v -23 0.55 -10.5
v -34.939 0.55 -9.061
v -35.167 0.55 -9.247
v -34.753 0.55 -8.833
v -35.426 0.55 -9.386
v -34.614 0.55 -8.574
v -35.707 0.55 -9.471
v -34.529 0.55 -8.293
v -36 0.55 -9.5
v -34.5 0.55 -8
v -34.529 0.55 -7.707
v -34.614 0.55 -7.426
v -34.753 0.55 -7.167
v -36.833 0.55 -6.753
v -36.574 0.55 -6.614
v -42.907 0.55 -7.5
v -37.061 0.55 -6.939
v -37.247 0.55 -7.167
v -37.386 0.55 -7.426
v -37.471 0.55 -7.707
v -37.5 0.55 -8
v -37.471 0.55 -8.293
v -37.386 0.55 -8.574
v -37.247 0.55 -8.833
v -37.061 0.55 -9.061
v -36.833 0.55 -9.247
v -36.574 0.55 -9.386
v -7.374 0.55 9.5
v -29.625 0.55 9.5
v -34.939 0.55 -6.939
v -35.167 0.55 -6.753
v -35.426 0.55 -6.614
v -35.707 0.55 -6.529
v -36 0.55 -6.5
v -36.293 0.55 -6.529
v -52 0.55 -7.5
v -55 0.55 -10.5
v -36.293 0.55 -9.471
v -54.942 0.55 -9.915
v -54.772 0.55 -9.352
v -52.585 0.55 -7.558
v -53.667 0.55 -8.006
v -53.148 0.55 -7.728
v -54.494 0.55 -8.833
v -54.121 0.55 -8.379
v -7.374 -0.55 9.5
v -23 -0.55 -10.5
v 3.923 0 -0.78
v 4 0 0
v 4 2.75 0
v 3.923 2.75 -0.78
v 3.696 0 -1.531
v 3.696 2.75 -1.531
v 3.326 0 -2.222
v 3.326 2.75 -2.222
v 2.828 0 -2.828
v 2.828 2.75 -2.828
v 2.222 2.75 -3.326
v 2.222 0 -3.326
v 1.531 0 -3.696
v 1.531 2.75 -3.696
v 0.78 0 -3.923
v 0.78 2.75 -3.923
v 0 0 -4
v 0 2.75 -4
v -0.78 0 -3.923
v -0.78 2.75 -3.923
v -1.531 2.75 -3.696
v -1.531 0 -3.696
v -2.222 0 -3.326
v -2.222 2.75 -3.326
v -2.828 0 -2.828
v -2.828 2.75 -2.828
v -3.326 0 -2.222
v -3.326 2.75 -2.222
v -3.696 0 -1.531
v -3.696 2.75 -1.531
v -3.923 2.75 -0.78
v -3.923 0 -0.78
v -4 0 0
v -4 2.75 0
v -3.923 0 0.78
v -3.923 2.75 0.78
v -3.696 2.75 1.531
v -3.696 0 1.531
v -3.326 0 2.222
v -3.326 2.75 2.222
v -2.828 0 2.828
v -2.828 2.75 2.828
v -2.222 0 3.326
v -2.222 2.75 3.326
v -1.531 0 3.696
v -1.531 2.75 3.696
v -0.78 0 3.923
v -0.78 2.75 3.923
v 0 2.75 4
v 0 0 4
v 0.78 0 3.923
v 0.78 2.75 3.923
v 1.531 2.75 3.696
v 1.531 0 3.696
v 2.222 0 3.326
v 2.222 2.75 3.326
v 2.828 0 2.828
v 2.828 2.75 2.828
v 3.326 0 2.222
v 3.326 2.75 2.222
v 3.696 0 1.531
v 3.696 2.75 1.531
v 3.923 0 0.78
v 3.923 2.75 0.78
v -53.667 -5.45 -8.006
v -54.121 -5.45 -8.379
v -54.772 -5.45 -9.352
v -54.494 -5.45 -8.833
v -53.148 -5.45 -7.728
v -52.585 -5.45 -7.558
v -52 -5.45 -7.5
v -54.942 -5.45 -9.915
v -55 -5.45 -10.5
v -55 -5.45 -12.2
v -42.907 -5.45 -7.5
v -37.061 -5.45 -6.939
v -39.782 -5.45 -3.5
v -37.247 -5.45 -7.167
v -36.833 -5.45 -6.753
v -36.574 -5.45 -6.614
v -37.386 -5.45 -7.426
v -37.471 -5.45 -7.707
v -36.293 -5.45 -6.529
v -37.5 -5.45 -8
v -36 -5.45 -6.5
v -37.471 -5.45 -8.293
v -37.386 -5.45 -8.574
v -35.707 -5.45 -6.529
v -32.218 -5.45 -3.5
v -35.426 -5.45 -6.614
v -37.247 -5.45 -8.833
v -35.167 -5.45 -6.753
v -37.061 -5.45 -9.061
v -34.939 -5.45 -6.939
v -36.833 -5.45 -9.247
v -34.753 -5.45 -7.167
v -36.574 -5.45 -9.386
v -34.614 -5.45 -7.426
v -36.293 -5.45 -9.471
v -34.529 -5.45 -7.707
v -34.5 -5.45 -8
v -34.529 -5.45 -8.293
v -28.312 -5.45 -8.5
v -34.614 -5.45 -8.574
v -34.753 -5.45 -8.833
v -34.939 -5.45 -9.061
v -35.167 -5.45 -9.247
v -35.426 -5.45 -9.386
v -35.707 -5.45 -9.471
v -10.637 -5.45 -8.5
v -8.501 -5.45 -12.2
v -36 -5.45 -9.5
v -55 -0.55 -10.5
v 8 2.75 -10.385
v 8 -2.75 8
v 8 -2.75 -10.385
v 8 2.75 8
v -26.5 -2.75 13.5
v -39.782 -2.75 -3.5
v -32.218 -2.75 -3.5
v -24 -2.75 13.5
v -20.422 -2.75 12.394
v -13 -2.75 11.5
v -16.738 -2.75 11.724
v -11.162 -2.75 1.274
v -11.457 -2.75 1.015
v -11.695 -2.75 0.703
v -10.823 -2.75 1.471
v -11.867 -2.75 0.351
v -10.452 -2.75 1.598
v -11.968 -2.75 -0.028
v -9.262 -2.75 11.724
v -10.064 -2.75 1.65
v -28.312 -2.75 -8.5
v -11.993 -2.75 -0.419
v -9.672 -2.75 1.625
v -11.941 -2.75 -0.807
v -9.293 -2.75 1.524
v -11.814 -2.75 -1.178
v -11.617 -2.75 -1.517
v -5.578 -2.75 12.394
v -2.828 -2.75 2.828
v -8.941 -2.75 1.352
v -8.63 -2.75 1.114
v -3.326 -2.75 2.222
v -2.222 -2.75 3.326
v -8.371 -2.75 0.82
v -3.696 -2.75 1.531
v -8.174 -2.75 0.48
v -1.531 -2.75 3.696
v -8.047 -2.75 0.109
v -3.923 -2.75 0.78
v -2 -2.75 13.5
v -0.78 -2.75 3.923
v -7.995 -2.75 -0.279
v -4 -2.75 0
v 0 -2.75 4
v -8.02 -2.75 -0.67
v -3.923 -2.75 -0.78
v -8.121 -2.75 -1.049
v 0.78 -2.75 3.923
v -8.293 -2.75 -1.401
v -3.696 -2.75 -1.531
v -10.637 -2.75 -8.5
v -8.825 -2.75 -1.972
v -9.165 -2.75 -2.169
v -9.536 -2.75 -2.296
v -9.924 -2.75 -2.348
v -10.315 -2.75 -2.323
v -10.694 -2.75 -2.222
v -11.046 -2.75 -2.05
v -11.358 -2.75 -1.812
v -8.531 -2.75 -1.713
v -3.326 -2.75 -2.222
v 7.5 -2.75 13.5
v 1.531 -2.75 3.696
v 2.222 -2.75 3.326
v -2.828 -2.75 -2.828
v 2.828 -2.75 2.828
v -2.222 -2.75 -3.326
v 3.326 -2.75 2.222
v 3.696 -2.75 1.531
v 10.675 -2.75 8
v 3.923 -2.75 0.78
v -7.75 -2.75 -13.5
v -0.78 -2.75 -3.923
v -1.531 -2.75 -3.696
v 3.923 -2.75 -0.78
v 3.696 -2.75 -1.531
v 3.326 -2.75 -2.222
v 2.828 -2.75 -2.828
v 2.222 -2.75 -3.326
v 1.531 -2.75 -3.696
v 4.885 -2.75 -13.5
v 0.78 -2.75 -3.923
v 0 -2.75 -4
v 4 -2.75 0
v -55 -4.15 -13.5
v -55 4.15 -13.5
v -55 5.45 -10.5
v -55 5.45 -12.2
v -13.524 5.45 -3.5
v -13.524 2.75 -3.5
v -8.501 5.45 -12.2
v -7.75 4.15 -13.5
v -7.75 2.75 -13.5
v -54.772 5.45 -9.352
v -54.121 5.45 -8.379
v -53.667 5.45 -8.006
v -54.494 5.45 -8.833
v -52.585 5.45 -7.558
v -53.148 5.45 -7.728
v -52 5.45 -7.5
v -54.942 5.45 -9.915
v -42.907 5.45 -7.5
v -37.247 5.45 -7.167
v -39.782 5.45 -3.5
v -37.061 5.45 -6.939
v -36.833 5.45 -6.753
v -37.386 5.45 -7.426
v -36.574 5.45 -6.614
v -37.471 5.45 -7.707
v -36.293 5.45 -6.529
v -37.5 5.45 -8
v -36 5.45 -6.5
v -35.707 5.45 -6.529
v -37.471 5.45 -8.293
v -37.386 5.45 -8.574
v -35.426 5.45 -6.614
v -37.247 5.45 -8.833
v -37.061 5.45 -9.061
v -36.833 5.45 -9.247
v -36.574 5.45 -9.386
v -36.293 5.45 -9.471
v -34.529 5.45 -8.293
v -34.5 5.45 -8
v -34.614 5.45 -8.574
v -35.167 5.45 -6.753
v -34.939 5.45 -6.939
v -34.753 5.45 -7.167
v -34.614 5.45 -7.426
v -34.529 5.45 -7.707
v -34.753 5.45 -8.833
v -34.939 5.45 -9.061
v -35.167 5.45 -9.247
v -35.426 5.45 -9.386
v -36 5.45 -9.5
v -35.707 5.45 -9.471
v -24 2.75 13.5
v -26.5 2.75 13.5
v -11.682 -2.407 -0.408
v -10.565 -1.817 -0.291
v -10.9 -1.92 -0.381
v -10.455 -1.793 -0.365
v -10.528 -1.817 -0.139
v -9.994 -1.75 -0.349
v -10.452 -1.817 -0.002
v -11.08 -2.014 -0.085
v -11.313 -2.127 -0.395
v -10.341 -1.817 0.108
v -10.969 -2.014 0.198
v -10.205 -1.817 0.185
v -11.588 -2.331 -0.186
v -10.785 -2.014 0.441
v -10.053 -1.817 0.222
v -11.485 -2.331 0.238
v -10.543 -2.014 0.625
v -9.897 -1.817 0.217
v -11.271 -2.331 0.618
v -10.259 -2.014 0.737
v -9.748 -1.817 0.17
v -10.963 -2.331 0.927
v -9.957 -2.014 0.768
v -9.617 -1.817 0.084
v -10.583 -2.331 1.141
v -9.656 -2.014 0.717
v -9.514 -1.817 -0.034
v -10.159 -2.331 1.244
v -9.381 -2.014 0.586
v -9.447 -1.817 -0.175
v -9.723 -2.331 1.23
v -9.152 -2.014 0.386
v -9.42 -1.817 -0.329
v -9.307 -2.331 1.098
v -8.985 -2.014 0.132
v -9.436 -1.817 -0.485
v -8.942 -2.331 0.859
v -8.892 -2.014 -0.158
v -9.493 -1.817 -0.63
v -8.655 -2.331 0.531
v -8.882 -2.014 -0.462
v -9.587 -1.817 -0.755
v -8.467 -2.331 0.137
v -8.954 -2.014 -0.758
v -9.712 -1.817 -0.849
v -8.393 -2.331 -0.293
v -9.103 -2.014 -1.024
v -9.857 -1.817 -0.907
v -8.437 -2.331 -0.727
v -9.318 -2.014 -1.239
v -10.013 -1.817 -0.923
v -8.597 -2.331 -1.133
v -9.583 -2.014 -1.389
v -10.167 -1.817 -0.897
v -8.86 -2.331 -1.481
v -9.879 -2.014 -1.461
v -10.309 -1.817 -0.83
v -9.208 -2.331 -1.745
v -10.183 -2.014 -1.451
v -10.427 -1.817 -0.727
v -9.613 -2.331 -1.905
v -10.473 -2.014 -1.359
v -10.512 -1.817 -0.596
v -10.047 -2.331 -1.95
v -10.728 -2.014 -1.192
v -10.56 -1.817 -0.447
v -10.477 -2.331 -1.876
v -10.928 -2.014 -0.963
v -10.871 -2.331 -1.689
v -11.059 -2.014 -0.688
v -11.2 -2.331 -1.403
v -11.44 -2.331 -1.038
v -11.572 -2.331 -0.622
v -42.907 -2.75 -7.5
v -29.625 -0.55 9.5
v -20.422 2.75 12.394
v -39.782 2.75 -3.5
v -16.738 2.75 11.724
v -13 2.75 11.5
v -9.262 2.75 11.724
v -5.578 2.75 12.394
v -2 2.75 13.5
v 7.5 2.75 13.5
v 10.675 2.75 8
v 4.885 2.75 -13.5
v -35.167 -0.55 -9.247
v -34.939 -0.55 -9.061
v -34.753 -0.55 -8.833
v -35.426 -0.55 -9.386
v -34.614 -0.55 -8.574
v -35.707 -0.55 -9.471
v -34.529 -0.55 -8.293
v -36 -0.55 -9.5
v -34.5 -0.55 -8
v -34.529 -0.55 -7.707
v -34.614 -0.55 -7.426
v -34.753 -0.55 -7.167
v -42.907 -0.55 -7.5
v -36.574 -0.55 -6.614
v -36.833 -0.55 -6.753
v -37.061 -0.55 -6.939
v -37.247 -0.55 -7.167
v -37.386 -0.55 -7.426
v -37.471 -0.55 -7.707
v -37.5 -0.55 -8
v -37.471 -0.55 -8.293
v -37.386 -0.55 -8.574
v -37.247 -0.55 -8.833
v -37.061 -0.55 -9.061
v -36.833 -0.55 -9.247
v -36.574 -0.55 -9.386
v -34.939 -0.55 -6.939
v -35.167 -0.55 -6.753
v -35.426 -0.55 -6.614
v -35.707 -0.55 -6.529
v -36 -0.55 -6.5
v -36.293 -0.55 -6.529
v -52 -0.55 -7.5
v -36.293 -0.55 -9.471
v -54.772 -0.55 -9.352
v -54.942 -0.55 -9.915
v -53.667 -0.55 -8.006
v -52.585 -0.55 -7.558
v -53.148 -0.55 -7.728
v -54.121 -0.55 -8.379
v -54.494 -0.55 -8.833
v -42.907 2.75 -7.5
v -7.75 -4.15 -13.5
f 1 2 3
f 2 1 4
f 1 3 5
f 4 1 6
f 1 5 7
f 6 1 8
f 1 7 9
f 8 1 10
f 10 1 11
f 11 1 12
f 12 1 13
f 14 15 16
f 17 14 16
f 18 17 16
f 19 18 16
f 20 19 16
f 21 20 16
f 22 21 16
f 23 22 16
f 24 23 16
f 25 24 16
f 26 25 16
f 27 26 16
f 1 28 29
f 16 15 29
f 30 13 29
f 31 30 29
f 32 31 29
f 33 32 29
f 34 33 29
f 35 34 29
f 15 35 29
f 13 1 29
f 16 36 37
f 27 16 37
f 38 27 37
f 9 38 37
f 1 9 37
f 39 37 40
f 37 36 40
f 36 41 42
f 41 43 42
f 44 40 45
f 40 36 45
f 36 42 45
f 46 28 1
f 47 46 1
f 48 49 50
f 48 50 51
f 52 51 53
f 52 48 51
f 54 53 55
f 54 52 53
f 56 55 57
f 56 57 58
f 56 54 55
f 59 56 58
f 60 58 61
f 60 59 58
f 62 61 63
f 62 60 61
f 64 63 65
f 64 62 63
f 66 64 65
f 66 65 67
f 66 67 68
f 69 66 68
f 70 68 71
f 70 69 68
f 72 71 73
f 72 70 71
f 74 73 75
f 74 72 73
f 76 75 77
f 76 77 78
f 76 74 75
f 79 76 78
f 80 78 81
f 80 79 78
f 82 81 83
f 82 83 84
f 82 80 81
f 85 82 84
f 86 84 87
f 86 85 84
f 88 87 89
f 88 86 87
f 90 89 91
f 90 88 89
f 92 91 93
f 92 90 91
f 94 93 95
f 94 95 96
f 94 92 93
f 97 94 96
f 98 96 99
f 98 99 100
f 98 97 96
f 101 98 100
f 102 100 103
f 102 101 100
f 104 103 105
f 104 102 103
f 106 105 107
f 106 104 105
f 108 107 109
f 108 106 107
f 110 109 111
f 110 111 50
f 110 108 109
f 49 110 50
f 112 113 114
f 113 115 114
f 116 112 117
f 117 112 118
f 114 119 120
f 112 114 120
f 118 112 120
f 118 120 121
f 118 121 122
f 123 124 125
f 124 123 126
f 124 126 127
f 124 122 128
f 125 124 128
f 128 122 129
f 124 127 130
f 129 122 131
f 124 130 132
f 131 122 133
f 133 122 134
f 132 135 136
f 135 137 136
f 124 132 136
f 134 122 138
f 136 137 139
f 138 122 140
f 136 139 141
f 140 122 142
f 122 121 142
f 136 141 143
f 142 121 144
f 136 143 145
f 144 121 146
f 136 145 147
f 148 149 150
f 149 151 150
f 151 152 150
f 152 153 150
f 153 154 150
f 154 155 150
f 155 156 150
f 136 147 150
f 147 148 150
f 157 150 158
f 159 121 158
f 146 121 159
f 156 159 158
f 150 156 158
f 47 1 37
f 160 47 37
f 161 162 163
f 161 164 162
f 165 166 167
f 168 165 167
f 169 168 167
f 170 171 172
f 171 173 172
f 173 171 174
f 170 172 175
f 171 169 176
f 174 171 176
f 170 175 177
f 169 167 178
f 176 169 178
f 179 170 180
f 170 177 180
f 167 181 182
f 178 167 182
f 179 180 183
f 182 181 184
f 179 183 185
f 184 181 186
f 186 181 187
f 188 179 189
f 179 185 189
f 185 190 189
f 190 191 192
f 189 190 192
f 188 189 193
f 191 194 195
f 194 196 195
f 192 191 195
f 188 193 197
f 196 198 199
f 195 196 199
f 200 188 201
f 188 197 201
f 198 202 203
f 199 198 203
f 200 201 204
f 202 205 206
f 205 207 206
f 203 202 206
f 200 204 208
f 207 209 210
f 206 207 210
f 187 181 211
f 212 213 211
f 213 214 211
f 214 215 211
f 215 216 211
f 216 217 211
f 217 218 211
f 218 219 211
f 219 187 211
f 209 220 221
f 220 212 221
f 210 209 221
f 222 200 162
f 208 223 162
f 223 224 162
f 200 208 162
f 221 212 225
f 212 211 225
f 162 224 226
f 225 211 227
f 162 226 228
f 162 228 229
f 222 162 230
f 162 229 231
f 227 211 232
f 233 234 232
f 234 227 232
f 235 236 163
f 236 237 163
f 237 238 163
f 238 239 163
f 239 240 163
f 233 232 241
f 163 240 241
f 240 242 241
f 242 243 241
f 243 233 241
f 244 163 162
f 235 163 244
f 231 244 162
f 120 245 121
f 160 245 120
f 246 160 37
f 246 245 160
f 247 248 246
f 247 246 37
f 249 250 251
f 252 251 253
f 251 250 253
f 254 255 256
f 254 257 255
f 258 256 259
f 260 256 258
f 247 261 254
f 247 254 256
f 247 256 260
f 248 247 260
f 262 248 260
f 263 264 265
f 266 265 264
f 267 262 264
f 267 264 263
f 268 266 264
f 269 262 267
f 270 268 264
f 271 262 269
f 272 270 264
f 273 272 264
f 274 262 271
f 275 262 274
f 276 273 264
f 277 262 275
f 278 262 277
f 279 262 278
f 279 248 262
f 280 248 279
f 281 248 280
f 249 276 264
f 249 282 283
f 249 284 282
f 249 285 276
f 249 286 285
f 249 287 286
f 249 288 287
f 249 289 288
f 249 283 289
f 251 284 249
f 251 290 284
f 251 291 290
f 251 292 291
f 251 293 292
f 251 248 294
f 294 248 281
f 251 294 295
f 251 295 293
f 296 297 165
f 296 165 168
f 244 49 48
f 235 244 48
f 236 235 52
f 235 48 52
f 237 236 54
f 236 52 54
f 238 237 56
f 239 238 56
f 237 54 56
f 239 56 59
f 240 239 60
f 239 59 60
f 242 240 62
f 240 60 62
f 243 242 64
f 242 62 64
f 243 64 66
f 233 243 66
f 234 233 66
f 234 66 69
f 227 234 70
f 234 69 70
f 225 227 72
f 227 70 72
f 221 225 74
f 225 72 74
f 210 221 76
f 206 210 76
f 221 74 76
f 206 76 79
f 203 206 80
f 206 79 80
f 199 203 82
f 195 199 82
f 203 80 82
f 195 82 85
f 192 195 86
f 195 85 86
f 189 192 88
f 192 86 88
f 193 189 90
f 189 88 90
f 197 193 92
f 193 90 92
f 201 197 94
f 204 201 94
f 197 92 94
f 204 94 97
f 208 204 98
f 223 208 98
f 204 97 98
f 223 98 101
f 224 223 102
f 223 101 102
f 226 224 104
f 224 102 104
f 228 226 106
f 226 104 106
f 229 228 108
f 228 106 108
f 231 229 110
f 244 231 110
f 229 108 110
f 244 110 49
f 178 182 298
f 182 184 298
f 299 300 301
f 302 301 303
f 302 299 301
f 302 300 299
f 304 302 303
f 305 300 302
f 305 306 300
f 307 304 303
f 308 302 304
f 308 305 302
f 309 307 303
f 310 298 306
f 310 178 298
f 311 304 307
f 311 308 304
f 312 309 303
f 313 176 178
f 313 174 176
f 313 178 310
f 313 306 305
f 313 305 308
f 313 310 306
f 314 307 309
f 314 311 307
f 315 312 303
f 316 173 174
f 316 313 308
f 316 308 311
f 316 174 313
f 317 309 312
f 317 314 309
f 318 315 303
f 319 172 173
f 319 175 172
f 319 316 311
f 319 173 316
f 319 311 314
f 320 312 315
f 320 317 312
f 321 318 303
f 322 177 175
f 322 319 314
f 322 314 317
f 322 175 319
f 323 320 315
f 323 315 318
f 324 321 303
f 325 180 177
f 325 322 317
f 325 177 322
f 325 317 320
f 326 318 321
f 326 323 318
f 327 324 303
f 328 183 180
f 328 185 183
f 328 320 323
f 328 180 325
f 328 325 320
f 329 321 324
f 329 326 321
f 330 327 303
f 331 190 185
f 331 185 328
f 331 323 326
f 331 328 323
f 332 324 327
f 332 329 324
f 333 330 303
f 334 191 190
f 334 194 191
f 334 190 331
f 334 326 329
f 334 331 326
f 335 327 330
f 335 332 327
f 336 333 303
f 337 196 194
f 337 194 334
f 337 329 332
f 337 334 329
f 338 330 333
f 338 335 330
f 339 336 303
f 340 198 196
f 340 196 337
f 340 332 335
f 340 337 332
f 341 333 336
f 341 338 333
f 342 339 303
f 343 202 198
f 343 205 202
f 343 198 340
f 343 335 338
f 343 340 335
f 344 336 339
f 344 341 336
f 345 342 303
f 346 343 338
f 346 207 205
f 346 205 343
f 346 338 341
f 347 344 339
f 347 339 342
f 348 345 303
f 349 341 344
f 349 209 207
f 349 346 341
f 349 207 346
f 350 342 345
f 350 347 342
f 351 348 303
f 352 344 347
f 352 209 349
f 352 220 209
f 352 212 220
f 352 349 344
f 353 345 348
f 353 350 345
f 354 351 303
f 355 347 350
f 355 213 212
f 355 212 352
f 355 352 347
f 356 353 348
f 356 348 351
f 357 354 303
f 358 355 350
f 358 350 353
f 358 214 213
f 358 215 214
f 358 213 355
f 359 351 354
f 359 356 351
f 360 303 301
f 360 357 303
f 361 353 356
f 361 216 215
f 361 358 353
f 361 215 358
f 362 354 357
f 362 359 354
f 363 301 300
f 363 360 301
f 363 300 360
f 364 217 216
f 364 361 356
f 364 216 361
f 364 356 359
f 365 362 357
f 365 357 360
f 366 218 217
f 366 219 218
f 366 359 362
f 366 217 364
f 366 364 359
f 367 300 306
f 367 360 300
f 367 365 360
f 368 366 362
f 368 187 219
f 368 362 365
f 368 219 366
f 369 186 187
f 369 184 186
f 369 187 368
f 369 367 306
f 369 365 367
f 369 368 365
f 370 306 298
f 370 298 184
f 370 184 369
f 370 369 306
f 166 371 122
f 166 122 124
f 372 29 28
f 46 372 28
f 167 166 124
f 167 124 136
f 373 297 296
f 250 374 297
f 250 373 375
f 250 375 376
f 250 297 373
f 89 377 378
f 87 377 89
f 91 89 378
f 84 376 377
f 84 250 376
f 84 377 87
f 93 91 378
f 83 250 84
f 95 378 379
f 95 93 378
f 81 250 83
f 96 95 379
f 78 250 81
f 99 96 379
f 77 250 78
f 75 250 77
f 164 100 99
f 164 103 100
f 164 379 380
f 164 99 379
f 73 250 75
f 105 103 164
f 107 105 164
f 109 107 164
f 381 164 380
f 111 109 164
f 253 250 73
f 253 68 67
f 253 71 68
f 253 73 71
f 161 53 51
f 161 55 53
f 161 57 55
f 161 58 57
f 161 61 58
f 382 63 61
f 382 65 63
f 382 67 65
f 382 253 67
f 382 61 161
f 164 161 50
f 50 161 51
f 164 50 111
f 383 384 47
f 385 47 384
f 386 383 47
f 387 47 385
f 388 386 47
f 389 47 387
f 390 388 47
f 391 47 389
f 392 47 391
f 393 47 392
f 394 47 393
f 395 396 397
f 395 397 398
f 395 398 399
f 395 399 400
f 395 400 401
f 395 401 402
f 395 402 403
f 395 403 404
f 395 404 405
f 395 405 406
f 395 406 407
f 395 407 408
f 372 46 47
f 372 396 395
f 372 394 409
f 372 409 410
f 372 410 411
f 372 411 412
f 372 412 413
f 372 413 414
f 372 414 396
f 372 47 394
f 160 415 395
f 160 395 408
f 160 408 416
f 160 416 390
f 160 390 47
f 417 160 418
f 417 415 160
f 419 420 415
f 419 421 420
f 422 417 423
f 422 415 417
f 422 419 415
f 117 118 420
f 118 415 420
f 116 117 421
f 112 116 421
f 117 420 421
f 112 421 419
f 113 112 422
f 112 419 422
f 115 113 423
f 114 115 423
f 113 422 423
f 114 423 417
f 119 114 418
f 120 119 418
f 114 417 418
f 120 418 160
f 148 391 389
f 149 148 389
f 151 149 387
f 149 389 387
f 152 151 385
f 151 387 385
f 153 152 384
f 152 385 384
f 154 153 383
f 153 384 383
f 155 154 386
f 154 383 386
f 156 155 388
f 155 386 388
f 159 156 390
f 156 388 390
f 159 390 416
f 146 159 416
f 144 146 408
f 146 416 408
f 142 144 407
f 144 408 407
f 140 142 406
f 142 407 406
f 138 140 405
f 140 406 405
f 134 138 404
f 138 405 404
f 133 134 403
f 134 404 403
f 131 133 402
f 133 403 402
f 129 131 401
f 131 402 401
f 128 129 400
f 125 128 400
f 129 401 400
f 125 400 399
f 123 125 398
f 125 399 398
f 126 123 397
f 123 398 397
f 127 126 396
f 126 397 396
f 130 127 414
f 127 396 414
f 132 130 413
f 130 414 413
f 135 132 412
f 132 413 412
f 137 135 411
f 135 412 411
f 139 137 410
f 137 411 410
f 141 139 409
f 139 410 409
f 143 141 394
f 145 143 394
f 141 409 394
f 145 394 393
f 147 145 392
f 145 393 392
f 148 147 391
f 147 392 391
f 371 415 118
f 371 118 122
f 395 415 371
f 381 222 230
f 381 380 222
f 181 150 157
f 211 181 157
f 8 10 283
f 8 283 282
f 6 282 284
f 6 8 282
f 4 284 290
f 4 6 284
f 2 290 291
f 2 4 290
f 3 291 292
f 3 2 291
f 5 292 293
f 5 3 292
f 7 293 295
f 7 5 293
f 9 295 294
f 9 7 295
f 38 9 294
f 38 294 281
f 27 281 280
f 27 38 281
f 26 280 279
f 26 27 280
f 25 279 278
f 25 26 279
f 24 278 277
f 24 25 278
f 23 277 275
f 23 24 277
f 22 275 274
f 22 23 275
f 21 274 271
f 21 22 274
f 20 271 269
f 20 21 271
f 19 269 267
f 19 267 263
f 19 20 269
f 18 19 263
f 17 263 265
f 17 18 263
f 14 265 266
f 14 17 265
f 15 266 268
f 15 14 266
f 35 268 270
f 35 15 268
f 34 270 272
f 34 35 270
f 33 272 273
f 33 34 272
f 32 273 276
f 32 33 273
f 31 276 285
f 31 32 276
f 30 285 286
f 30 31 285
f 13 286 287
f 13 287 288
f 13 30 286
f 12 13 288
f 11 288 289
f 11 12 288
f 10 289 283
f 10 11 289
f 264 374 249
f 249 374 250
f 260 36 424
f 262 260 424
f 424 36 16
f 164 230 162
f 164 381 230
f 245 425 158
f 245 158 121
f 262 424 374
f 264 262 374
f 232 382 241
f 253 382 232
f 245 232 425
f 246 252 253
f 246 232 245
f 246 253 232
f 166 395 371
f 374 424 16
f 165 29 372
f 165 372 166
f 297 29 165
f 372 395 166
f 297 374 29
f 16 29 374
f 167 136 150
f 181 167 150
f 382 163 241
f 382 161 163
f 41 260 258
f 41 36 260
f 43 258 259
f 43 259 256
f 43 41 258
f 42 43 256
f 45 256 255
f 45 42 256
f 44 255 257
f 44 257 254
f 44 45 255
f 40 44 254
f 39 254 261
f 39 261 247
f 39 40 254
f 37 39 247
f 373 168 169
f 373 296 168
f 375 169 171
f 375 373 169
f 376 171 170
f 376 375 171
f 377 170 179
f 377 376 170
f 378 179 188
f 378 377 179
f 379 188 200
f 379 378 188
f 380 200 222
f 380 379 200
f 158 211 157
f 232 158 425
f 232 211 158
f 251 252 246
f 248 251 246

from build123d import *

# Parameters (mm, degrees)
SKETCH1_R           = 4
SKETCH1_R_2         = 1.5
BOSS_EXTRUDE1_DEPTH = 2.75
SKETCH2_R           = 1.5
BOSS_EXTRUDE2_DEPTH = 2.7
CUT_EXTRUDE1_DEPTH  = 0.55
FILLET1_R           = 3
CHAMFER1_SIZE       = 1.3
CUT_EXTRUDE3_DEPTH  = 2.7


with BuildPart() as part:
    # Sketch1 → Boss-Extrude1 (new body)
    with BuildSketch(Plane(origin=(0, 0, 0), x_dir=(1, 0, 0), z_dir=(0, 1, 0))):
        with BuildLine():
            Line((4.884776311, 13.5), (-55, 13.5))
            Line((-55, 13.5), (-55, 7.5))
            Line((-55, 7.5), (-42.906998157, 7.5))
            Line((-42.906998157, 7.5), (-26.5, -13.5))
            Line((-26.5, -13.5), (-24, -13.5))
            ThreePointArc((-24, -13.5), (-13, -11.5), (-2, -13.5))
            Line((-2, -13.5), (7.5, -13.5))
            Line((7.5, -13.5), (10.675426481, -8))
            Line((10.675426481, -8), (8, -8))
            Line((8, -8), (8, 10.384776311))
            Line((8, 10.384776311), (4.884776311, 13.5))
        make_face()
        Circle(SKETCH1_R, mode=Mode.SUBTRACT)
        with Locations((-36, 8)):
            Circle(SKETCH1_R_2, mode=Mode.SUBTRACT)
    extrude(amount=BOSS_EXTRUDE1_DEPTH)

    # Sketch2 → Boss-Extrude2 (add)
    with BuildSketch(Plane(origin=(0, 2.75, 0), x_dir=(1, 0, 0), z_dir=(0, 1, 0))):
        Polygon((-39.781855651, 3.5), (-13.523502692, 3.5), (-7.75, 13.5), (-55, 13.5), (-55, 7.5), (-42.906998157, 7.5), align=None)
        with Locations((-36, 8)):
            Circle(SKETCH2_R, mode=Mode.SUBTRACT)
    extrude(amount=BOSS_EXTRUDE2_DEPTH)

    # Sketch3 → Cut-Extrude1 (cut)
    with BuildSketch(Plane.XZ):
        Polygon((-23, -10.5), (-55, -10.5), (-55, 9.5), (-7.37428747, 9.5), align=None)
    extrude(amount=-CUT_EXTRUDE1_DEPTH, mode=Mode.SUBTRACT)

    # Fillet1
    fillet1_edges = [part.edges().sort_by_distance(p)[0] for p in [
        (-55, 3, -7.5),
    ]]
    fillet(fillet1_edges, radius=FILLET1_R)

    # Chamfer1
    chamfer1_edges = [part.edges().sort_by_distance(p)[0] for p in [
        (-31.375, 5.45, -13.5),
    ]]
    chamfer(chamfer1_edges, length=CHAMFER1_SIZE)

    # Mirror1: part across plane


with BuildPart() as part_1:
    add(part.part)
    add(part.part.mirror(Plane.ZX))

    # Sketch6 → Cut-Extrude3 (cut)
    with BuildSketch(Plane.XZ.offset(5.45)):
        Polygon((-32.218144349, -3.5), (-28.311716217, -8.5), (-10.636751346, -8.5), (-13.523502692, -3.5), align=None)
    extrude(amount=-CUT_EXTRUDE3_DEPTH, mode=Mode.SUBTRACT)

    # Sketch7 → Cut-Revolve1 (revolve, cut)
    with BuildSketch(Plane(origin=(0, 0, 0), x_dir=(0.999390827, 0, 0.034899497), z_dir=(-0.034899497, 0, 0.999390827))):
        with BuildLine():
            Line((-10, -2.75), (-10, -1.75))
            ThreePointArc((-10, -1.75), (-11.118033989, -2.013932023), (-12, -2.75))
            Line((-12, -2.75), (-10, -2.75))
        make_face()
    revolve(axis=Axis((-9.99390827, -10.952082058, -0.348994967), (0, 1, 0)), mode=Mode.SUBTRACT)


solid = part_1.part
